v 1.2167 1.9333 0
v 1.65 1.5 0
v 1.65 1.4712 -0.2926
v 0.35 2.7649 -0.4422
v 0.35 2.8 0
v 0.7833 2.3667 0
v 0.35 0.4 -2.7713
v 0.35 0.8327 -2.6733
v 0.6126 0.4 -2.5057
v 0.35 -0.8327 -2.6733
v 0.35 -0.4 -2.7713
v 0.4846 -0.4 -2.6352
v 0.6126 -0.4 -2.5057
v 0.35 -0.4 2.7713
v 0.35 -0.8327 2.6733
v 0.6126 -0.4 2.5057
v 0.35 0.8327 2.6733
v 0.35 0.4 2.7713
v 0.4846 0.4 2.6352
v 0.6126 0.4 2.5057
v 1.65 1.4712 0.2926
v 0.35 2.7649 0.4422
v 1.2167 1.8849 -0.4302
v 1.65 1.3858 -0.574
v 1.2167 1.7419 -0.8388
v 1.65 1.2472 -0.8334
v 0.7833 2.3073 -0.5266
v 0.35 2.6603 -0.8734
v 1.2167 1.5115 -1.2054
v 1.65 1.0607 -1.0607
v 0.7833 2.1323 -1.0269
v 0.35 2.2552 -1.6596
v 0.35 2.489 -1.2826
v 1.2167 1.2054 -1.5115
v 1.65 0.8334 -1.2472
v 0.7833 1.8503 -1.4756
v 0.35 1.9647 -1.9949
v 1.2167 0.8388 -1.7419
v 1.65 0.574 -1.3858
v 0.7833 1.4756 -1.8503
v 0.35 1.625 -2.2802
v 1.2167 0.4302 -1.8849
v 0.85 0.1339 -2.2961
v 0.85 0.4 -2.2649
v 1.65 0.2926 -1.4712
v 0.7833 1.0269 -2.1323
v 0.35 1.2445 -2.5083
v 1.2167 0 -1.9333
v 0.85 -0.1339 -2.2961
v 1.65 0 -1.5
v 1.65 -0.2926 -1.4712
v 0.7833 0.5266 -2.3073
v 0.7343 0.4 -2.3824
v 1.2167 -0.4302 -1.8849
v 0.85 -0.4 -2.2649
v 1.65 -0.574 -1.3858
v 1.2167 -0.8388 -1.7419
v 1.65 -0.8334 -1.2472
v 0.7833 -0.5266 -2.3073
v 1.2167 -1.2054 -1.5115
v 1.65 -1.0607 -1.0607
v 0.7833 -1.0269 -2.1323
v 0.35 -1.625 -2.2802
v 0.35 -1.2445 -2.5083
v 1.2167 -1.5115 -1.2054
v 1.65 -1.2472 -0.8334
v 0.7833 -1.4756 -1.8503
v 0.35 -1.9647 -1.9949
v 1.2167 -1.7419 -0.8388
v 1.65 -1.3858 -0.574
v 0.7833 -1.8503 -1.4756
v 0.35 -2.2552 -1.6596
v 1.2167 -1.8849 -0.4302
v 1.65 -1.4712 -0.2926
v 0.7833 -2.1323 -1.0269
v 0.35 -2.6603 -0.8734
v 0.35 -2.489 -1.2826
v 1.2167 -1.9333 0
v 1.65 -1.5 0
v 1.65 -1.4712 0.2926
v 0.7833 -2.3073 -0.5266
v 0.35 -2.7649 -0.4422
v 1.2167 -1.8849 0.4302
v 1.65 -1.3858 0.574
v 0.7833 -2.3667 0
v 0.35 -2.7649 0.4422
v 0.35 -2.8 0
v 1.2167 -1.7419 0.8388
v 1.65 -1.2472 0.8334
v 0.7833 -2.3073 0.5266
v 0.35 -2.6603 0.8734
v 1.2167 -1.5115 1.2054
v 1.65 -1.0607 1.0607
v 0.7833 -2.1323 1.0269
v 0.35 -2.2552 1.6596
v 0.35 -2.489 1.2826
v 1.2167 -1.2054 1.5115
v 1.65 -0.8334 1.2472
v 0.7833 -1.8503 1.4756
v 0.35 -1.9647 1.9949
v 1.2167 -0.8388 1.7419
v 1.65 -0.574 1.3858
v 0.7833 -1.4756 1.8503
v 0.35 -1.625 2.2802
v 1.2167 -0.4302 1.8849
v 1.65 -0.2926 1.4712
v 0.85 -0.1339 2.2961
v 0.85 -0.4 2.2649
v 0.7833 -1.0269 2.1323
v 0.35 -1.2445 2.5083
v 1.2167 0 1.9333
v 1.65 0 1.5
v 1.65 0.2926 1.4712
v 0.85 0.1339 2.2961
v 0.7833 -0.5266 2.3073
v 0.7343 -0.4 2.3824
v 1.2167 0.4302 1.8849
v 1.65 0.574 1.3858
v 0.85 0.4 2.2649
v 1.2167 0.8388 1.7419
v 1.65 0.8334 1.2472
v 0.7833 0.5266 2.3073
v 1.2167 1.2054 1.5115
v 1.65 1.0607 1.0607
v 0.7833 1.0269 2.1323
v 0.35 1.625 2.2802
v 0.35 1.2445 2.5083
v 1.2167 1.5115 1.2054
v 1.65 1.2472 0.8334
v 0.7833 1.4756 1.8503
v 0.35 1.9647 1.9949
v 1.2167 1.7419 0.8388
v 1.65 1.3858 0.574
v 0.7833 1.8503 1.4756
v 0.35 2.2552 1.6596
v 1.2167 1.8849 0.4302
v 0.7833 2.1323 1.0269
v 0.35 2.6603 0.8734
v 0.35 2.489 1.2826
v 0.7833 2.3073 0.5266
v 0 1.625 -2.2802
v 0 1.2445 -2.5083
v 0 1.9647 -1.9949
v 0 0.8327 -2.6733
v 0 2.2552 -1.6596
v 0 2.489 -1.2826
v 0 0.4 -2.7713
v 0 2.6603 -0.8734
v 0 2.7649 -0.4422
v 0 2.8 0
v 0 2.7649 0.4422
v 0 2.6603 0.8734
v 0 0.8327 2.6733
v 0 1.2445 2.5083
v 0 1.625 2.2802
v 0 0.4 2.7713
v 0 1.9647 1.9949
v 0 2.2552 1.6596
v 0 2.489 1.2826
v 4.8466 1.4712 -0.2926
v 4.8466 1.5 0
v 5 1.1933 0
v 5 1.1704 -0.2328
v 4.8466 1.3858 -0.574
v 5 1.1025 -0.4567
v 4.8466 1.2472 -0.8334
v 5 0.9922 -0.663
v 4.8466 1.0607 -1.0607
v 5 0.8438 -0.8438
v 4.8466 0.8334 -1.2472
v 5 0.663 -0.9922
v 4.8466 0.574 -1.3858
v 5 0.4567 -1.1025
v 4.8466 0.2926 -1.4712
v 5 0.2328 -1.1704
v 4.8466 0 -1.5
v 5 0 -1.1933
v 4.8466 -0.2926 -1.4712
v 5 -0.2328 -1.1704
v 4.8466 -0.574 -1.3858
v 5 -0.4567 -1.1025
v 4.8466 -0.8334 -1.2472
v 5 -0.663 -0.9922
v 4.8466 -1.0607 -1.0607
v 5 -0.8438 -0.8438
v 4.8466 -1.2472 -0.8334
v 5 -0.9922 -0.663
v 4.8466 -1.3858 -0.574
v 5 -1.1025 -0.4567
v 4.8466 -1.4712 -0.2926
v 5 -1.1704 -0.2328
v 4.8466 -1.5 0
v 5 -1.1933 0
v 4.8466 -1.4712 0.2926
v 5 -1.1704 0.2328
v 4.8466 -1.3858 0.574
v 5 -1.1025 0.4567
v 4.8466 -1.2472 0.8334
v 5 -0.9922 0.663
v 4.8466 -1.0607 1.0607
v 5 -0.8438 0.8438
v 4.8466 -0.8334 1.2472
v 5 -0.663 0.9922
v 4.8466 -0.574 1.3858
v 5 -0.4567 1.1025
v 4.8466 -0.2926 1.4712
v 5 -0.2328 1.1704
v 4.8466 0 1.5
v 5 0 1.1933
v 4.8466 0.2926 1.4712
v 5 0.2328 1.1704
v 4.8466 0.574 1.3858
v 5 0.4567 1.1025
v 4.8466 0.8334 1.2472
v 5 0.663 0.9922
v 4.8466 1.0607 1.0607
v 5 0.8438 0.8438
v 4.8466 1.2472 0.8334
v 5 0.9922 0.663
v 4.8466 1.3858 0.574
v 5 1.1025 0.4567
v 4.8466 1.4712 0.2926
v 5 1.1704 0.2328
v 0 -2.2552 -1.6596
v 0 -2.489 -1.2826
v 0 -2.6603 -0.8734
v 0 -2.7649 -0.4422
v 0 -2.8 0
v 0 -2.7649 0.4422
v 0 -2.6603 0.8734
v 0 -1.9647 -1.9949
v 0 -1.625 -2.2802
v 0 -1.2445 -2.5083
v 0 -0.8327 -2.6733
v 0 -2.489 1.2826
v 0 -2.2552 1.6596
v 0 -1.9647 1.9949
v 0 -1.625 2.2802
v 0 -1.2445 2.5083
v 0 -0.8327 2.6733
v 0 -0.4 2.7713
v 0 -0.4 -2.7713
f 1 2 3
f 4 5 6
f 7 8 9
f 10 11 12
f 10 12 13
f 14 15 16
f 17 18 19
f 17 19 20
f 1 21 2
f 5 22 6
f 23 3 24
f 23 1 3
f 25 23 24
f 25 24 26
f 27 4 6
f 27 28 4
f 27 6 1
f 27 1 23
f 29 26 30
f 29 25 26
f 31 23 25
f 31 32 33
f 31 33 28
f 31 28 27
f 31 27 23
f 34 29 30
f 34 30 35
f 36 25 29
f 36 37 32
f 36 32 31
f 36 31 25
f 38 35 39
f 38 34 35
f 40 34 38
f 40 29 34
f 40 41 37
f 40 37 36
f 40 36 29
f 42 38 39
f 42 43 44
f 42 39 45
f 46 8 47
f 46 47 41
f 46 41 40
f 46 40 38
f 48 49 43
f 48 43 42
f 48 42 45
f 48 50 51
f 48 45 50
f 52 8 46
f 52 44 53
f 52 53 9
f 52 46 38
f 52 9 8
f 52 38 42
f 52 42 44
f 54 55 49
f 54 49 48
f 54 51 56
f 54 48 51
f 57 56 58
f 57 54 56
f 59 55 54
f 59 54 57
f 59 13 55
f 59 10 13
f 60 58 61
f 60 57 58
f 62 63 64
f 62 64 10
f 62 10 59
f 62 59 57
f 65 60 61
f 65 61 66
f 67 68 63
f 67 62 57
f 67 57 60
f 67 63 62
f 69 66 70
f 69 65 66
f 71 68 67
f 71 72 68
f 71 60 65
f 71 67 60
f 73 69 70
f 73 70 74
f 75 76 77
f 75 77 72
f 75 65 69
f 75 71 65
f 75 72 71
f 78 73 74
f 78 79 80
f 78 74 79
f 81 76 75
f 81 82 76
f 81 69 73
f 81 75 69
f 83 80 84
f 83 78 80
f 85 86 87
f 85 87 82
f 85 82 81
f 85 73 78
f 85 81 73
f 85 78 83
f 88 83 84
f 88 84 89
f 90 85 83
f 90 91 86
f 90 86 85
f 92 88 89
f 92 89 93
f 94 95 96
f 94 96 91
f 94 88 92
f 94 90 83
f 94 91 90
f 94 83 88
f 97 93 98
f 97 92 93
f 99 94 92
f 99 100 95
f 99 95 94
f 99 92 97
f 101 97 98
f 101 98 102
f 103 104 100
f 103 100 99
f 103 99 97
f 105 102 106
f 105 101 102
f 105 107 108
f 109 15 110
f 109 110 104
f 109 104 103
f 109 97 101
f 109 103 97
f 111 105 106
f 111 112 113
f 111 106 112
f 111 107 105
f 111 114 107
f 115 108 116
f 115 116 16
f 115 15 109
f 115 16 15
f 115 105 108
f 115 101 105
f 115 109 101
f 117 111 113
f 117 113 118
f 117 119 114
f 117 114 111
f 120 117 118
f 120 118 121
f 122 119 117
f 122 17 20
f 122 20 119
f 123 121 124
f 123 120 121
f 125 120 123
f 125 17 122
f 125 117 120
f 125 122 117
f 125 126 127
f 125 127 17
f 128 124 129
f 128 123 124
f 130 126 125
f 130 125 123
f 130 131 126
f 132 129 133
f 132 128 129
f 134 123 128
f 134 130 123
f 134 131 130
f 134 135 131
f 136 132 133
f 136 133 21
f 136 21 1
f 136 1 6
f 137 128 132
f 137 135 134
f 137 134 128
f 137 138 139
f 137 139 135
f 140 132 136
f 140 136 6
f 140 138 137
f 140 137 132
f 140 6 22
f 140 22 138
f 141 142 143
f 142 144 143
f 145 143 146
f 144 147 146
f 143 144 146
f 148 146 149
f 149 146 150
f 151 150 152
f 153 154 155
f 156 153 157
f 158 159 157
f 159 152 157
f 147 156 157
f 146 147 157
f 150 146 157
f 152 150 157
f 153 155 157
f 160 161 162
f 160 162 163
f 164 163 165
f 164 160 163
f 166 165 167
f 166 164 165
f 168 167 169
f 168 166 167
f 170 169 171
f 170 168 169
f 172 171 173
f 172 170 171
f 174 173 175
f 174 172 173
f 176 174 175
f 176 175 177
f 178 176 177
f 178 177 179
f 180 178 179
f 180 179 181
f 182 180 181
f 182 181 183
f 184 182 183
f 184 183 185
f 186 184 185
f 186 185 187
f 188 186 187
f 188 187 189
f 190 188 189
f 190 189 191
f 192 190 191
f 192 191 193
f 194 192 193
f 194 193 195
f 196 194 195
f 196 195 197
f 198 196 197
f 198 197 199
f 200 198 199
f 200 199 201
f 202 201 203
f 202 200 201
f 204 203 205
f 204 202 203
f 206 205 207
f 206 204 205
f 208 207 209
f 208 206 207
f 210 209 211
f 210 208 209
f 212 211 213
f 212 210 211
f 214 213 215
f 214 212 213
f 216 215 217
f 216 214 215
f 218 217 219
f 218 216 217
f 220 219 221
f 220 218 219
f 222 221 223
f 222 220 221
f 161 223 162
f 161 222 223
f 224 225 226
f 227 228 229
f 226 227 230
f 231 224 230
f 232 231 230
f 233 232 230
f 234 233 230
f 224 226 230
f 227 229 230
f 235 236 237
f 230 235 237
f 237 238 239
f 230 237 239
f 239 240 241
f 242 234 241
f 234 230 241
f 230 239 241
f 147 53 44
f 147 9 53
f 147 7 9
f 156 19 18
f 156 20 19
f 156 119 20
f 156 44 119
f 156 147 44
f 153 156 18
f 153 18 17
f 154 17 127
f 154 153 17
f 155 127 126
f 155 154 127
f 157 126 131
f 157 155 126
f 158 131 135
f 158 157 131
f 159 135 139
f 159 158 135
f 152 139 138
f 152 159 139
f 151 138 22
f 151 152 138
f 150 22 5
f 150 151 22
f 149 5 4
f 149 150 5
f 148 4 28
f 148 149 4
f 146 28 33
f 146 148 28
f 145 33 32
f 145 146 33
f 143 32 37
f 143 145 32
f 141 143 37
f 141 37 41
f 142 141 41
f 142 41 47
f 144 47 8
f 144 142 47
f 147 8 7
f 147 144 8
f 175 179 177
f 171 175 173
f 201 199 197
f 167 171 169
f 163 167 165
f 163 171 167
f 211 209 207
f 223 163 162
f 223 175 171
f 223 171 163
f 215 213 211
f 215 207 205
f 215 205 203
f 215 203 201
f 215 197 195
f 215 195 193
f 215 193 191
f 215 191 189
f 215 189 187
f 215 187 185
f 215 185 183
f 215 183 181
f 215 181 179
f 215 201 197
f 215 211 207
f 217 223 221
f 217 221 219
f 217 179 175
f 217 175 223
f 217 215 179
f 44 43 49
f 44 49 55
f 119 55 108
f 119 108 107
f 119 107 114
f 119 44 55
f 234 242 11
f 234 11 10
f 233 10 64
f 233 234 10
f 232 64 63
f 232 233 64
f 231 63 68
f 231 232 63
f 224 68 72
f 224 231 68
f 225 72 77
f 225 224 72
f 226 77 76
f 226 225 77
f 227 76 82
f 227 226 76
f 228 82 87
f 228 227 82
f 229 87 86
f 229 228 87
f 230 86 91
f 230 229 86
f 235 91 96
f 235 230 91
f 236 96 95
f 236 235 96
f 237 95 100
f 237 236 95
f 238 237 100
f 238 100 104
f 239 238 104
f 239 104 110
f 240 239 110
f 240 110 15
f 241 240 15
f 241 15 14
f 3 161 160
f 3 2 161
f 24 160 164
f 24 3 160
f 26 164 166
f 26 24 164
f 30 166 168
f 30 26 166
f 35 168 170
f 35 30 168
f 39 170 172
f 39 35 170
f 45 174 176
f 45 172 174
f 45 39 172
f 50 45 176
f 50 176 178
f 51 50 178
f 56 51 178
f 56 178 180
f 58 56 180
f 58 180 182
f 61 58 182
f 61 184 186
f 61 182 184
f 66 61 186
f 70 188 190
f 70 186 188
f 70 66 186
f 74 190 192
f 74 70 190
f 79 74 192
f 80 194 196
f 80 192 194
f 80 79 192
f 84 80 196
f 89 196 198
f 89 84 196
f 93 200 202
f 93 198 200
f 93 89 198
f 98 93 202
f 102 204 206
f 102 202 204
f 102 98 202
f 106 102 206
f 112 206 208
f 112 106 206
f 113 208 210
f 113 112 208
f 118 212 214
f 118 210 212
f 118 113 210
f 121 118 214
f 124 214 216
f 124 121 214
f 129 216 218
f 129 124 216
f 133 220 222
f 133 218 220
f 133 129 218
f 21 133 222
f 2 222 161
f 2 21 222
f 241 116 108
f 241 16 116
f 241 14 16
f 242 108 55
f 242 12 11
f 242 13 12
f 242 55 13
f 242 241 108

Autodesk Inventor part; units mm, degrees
ref_plane "YZ Plane" through (0, 0, 0) normal (1, 0, 0) x (0, 1, 0)
ref_plane "XZ Plane" through (0, 0, 0) normal (0, 1, 0) x (-1, 0, 0)
sketch "Skizze1" plane through (0, 0, 0) normal (0, 0, 1) x (1, 0, 0)
  line L0 (0, 0) -> (5, 0)
  line L1 (5, 0) -> (5, 1.5)
  line L2 (5, 1.5) -> (2.65, 1.5)
  line L3 (2.65, 1.5) -> (2.3433, 1.5)
  line L4 (2.3433, 1.5) -> (1.65, 1.5)
  line L5 (1.65, 1.5) -> (0.35, 2.8)
  line L6 (0.35, 2.8) -> (0, 2.8)
  line L7 (0, 2.8) -> (0, 0)
  line L8 (2.65, 1.5) -> (1.65, 1.5) construction
  line L9 (-1, 0) -> (6, 0) projected
  line L10 (0, 3.36) -> (0, -0.56) projected
  dimension "d0" = 5
  dimension "d1" = 45
  dimension "d2" = 0.3067
  dimension "d3" = 2.35
  dimension "d4" = 1.65
  dimension "d5" = 3
  dimension "d6" = 3
  dimension "d7" = 5.6
revolve "Körper" add sketch "Skizze1" angle 360 about axis through (0, 0, 0) along (1, 0, 0)
sketch "Skizze2" plane through (0, 0, 0) normal (-1, 0, 0) x (0, 0, 1)
  line L0 (2.8, -0.4) -> (-2.8, -0.4)
  line L1 (-2.8, -0.4) -> (-2.8, 0.4)
  line L2 (-2.8, 0.4) -> (2.8, 0.4)
  line L3 (2.8, 0.4) -> (2.8, -0.4)
  line L4 (0, 0.4) -> (0, -0.4) construction
  line L5 (-2.8, 0) -> (2.8, 0) construction
  line L6 (0, 2.8) -> (0, 0) projected
  dimension "d15" = 0.8
  dimension "d16" = 5.6
extrude "Loch" cut sketch "Skizze2" against normal blind 0.85
thread "Gewinde" size "M3x0.5" class "6g" standard "ISO Metric profile" length 2.35
chamfer "Fase1" distance 0.3067 distance2 0.1534 1 edges at (5, -1.5, 0) measured on face at (5, -0.5112, 0.3316)
ref_plane "Work Plane1" through (33.575, 0, 0) normal (0, 0, -1) x (1, 0, 0)
equation "\"d1\" = 0.5 * SEWI"
equation "\"d2\" = GAL"
equation "\"d4\" = KOH"
equation "\"d5\" = BDM"
equation "\"d6\" = GD"
equation "\"d7\" = KOD"
equation "\"d15\" = SBR"
equation "\"d16\" = KOD"
equation "\"d8\" = STI"
equation "\"d12\" = -0.5 * SPD + 0.5 * GD"
equation "\"d13\" = 0.5 * GAL"
equation "\"NLG\" = 4"
equation "\"GAL\" = 0.61345 * PTC"
equation "\"GEL\" = 1.35"
equation "\"KOH\" = 1.65"
equation "\"KOD\" = 5.6"
equation "\"SEWI\" = 90deg"
equation "\"BDM\" = NND"
equation "\"GD\" = NND"
equation "\"SBR\" = 0.8"
equation "\"STI\" = 0.85"
equation "\"SPD\" = NND - 1.2269 * PTC"
equation "\"GUL\" = 0.61345 * PTC"
equation "\"PTC\" = 0.5"
equation "\"EPV\" = 3.15"
equation "\"THREADDIA\" = 3"
equation "\"TOA\" = 30deg"
equation "\"NND\" = 3"
equation "\"GD1\" = THREADDIA - 1.2269 * PTC"
properties part number "DIN 963 - M3 x 4" material "Edelstahl"
